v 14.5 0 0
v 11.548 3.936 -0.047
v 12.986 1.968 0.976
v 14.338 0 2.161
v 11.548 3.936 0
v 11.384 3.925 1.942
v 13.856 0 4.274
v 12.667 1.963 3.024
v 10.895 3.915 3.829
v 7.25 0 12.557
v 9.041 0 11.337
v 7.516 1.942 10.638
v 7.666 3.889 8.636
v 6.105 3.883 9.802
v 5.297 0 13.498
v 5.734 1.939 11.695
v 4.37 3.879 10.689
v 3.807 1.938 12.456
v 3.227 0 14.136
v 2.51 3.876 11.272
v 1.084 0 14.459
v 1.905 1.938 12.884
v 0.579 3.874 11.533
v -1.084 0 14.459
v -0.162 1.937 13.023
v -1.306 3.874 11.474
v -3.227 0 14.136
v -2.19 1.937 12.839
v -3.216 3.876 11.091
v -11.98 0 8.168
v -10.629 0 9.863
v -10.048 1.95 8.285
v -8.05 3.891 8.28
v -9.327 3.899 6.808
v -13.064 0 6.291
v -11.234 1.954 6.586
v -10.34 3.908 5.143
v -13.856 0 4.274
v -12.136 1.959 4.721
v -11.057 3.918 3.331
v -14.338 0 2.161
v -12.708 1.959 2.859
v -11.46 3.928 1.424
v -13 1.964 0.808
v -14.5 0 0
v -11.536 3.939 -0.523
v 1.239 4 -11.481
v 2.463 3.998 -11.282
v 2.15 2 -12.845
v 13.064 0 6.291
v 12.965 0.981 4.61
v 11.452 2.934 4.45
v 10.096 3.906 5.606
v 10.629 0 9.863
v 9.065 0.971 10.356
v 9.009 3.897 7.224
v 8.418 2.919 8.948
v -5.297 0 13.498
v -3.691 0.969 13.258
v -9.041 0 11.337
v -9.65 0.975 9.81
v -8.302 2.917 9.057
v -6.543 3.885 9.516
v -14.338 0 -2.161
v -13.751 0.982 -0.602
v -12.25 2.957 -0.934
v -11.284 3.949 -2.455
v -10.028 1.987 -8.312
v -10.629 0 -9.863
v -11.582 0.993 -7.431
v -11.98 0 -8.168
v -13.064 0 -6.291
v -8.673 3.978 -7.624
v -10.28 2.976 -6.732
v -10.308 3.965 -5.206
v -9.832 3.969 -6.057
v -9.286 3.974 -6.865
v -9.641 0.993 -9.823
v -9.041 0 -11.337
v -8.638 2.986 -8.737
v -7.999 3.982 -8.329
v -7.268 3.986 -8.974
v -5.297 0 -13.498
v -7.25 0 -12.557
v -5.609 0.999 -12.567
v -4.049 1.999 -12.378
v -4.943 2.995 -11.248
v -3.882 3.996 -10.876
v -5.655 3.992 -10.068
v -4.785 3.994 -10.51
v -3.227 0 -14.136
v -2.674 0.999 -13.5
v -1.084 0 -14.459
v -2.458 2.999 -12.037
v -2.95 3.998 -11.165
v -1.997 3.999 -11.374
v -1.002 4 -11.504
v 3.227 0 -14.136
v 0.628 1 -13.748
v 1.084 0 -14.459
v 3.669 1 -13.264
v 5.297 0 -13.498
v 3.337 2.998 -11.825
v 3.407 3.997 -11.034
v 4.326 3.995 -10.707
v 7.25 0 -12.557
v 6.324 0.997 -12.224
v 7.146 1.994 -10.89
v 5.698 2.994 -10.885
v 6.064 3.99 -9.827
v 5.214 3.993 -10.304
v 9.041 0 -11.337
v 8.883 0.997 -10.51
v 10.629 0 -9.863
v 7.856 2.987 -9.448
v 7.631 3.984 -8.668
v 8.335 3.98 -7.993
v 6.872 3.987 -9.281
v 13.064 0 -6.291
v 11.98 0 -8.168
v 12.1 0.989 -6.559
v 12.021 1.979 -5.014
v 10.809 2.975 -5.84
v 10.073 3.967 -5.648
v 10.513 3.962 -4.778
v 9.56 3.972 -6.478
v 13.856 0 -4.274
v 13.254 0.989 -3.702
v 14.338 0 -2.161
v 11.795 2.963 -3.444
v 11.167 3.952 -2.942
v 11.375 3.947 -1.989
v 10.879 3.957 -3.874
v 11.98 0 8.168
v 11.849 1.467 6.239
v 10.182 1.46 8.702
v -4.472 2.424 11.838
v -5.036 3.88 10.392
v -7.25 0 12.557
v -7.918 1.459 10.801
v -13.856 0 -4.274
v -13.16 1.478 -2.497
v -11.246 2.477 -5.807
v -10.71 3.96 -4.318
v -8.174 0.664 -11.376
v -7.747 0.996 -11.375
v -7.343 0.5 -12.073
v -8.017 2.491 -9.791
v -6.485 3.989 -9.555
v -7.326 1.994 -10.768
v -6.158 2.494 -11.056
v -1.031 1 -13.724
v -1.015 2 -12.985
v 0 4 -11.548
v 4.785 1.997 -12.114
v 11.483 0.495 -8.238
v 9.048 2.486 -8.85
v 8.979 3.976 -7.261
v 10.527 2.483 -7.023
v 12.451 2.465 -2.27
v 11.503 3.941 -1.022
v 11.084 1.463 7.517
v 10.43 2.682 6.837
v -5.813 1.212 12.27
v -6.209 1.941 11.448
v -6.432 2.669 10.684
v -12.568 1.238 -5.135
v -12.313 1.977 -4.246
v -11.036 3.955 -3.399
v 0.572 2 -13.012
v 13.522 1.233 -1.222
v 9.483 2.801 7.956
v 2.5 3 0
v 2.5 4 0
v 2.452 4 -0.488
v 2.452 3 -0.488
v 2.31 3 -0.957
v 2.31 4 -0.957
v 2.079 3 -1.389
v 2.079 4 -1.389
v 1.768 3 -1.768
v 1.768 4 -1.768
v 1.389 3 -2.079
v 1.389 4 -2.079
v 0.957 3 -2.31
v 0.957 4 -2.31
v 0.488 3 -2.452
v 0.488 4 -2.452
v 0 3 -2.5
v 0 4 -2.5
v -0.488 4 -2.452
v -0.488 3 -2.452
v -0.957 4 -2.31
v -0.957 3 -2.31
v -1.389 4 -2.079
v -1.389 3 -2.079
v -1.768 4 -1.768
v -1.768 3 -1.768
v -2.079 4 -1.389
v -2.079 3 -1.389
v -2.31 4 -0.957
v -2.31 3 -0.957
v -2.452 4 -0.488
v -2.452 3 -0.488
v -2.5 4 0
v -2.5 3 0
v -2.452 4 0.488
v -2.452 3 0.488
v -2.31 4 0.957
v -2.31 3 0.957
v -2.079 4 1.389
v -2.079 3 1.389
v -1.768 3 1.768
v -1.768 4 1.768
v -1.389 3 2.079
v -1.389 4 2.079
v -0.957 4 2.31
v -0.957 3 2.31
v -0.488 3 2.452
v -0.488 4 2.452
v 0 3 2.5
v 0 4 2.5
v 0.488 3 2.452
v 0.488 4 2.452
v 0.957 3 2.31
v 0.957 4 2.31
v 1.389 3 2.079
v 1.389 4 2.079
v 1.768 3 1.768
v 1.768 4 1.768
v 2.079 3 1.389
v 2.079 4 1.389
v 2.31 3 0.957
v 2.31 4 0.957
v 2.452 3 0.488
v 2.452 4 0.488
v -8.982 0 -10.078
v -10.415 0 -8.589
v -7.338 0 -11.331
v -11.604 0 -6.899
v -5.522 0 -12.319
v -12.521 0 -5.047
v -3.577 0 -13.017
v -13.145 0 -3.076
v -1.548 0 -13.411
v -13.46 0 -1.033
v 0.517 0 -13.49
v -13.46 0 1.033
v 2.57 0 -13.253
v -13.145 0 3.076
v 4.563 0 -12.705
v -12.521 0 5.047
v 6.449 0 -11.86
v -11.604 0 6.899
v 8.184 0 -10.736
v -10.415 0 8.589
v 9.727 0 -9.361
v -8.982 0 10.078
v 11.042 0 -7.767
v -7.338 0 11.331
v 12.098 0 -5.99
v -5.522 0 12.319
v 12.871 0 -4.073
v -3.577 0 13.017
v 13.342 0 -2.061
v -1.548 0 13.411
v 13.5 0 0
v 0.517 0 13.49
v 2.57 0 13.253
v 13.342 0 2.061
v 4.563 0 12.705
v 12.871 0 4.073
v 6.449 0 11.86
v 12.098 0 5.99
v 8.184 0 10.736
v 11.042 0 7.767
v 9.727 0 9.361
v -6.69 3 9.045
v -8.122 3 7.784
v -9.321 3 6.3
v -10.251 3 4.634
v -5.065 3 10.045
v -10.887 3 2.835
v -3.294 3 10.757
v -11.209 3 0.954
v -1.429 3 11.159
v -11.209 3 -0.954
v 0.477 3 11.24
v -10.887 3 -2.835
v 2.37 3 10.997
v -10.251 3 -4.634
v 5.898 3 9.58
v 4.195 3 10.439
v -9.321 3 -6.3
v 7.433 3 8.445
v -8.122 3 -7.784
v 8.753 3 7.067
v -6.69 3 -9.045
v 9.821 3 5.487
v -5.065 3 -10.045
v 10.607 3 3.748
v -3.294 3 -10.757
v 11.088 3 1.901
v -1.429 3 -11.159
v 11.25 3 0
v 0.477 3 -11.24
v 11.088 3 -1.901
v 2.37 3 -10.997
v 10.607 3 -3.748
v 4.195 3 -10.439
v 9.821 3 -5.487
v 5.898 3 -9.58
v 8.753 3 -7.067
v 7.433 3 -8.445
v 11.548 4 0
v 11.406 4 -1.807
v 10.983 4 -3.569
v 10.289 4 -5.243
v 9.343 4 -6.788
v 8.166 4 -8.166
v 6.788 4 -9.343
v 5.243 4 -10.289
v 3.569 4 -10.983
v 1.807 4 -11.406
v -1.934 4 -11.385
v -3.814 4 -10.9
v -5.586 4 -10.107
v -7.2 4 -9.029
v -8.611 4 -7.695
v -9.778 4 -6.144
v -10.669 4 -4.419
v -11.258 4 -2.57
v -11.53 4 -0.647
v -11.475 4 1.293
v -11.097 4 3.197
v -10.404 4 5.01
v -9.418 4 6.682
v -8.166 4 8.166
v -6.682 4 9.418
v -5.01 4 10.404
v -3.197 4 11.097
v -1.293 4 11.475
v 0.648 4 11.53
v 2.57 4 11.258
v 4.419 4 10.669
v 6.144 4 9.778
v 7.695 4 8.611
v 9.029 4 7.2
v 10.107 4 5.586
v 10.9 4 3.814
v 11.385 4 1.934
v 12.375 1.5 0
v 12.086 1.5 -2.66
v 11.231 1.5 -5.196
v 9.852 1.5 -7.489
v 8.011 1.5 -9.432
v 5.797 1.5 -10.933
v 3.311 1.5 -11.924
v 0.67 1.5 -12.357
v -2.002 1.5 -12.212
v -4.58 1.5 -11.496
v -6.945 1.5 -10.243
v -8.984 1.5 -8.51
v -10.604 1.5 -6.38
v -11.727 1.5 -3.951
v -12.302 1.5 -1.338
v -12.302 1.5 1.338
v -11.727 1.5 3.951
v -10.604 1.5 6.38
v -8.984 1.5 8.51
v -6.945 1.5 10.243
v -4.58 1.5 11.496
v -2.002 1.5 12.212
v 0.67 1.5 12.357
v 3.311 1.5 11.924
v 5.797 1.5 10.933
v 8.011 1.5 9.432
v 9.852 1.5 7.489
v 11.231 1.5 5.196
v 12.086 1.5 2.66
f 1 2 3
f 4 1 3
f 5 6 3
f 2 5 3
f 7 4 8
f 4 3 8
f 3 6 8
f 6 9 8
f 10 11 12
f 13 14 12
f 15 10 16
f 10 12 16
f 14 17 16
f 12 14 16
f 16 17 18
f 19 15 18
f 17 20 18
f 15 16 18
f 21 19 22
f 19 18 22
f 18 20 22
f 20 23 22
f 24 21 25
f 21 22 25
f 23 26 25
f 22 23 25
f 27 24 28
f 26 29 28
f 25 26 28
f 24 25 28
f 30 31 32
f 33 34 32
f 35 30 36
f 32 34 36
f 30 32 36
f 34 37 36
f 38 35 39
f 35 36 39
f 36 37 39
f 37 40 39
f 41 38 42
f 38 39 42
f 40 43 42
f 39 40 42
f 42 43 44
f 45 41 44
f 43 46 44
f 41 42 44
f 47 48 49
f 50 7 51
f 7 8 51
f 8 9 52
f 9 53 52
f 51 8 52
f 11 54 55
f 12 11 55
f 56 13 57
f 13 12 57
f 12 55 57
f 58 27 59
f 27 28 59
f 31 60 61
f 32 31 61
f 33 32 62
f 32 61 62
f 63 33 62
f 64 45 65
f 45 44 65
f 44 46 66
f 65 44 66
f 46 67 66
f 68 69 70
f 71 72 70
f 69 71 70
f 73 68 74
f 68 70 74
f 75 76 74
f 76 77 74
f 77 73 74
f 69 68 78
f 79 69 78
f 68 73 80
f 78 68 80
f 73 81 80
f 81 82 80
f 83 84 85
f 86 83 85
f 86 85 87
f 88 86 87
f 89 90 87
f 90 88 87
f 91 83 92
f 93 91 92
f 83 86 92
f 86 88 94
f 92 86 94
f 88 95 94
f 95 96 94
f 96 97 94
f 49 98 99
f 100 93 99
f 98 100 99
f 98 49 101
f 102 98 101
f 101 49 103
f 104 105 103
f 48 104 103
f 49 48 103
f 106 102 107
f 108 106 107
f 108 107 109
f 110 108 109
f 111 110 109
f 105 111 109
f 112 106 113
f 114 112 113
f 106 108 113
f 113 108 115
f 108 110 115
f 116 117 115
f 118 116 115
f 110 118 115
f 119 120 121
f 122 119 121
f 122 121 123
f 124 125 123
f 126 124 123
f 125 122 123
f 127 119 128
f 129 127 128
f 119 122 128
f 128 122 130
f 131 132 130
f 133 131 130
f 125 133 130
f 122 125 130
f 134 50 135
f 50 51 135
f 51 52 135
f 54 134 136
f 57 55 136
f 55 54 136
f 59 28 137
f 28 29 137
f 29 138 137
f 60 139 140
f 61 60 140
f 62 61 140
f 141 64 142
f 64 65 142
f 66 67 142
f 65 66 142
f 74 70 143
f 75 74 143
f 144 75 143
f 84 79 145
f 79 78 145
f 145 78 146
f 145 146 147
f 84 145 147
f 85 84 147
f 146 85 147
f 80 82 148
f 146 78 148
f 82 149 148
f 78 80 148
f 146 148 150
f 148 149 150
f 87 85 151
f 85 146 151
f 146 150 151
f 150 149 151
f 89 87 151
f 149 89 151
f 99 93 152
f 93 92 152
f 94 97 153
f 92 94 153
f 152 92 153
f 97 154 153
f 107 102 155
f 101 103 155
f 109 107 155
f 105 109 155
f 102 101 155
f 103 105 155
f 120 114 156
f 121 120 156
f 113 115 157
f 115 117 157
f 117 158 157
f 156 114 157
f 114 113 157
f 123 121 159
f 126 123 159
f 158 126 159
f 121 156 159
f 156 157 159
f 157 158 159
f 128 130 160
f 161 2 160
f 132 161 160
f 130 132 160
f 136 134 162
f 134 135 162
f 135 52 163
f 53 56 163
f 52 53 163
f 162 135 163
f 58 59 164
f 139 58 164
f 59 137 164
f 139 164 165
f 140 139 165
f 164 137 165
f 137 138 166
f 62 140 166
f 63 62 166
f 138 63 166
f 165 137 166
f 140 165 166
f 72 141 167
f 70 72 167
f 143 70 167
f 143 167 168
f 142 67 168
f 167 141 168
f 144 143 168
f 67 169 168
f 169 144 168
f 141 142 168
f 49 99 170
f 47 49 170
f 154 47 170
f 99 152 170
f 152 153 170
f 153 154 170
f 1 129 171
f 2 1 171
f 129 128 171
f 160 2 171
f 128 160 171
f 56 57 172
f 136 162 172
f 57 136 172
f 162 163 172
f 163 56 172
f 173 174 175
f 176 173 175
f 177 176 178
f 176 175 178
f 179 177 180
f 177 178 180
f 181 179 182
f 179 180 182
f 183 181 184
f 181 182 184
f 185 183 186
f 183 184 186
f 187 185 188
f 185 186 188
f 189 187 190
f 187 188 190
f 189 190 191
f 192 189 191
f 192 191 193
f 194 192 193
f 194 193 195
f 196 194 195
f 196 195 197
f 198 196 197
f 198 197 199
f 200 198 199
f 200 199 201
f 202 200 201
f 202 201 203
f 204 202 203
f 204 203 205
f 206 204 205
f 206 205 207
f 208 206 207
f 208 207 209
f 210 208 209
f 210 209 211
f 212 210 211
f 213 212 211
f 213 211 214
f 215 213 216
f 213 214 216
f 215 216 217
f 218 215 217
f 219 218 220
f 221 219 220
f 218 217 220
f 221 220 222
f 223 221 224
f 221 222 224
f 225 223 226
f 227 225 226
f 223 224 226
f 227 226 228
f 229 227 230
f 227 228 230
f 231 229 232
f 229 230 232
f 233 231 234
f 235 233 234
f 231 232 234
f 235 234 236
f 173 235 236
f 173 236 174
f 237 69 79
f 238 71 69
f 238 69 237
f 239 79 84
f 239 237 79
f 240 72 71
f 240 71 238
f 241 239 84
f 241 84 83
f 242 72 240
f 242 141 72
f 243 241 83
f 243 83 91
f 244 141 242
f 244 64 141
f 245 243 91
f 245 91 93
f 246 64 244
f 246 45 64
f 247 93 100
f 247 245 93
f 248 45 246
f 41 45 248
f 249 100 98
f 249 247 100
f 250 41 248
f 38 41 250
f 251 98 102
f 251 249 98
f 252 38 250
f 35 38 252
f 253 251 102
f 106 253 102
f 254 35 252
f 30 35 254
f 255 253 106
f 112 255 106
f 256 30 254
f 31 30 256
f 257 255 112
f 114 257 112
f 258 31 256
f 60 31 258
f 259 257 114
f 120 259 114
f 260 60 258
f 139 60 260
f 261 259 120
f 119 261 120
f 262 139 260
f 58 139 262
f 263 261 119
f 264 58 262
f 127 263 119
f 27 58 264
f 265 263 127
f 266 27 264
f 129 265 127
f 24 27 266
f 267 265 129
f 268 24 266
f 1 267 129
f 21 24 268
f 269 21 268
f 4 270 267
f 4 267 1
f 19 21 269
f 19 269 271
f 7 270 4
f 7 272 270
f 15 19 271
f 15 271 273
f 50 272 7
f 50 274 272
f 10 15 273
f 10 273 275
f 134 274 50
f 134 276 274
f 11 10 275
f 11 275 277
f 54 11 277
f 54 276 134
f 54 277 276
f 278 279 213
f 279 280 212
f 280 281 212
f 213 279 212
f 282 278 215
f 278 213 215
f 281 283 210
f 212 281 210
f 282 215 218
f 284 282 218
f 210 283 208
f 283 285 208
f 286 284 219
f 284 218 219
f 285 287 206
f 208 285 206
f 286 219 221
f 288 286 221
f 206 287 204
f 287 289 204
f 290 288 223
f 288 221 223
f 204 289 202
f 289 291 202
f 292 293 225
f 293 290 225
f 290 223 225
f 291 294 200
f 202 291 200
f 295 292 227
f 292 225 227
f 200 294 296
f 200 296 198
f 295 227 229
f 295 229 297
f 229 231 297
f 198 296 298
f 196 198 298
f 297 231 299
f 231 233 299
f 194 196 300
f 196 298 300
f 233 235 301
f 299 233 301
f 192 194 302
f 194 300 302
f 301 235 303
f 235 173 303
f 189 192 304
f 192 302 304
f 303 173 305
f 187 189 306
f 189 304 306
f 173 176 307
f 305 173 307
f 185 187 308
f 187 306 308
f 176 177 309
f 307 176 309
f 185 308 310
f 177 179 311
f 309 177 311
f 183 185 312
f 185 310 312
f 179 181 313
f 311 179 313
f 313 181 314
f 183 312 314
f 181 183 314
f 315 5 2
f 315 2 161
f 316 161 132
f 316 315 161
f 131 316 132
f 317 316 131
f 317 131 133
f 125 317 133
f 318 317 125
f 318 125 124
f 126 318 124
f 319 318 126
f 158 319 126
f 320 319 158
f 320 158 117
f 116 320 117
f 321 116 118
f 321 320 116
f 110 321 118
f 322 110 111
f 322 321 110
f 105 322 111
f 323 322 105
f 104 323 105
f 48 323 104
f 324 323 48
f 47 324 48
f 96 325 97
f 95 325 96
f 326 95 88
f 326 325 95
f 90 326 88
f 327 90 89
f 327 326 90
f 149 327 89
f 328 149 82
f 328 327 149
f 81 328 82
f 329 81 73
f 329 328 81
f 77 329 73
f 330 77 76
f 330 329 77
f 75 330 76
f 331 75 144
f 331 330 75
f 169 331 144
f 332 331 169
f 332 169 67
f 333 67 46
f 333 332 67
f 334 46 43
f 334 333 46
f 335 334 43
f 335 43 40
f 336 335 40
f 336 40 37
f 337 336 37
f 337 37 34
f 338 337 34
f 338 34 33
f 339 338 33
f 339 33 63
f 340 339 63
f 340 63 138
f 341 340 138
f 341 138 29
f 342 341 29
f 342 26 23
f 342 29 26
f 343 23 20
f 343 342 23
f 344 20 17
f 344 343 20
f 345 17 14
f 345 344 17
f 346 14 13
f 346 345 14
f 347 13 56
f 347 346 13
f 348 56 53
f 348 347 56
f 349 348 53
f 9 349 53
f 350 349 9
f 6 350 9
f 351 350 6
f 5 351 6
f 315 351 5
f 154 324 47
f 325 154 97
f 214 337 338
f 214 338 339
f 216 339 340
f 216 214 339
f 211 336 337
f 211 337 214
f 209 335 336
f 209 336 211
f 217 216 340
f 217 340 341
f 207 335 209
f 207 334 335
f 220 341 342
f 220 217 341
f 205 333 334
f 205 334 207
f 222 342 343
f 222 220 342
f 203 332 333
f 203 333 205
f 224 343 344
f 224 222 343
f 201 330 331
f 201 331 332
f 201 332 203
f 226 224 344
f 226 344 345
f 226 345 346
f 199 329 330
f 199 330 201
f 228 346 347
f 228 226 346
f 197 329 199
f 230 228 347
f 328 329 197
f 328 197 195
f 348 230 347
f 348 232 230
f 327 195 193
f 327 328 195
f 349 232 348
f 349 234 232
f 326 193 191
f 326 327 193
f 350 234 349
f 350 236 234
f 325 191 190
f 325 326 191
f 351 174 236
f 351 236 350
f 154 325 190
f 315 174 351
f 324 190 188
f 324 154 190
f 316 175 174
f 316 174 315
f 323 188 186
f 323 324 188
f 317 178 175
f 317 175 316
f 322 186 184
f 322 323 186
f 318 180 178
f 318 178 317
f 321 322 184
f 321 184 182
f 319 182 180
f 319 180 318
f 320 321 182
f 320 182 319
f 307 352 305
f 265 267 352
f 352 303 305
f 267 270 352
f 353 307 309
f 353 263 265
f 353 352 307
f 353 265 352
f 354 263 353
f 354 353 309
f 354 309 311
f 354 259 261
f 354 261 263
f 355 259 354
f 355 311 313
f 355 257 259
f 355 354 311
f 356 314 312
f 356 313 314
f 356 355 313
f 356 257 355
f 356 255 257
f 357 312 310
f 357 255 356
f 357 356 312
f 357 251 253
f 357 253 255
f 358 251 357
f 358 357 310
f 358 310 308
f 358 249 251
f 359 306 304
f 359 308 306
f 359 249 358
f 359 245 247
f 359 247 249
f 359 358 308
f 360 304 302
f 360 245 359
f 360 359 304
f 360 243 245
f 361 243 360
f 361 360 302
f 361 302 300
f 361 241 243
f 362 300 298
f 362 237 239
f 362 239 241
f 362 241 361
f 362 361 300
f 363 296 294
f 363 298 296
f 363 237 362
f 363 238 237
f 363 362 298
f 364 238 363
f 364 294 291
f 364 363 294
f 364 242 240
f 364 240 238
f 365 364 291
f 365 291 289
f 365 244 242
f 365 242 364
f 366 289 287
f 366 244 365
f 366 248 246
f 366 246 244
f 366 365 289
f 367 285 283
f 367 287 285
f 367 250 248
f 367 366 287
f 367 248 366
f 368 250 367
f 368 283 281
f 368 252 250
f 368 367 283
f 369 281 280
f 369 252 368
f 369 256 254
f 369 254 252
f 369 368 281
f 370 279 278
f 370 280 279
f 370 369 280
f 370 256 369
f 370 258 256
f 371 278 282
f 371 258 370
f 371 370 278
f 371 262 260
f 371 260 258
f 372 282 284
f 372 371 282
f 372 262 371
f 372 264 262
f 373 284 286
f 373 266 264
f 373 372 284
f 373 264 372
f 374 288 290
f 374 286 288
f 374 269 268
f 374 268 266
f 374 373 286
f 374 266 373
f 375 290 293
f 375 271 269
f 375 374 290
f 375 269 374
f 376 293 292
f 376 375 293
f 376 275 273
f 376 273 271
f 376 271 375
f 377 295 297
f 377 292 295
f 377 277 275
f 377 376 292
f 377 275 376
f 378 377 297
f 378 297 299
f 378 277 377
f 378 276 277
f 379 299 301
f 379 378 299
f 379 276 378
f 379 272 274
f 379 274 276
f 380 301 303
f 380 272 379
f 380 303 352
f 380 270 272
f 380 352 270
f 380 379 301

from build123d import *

# Parameters (mm, degrees)
SKETCH_R     = 14.5
SKETCH001_R  = 11.5
SKETCH003_R  = 10.5
SKETCH002_R  = 13.5
SKETCH004_R  = 11.547972
PAD_DEPTH    = 1
SKETCH005_R  = 2.5
POCKET_DEPTH = 5


with BuildPart() as part:
    # Sketch → AdditiveLoft section 0
    with BuildSketch(Plane.XZ):
        Circle(SKETCH_R)
    # Sketch001 (on DatumPlane) → AdditiveLoft section 1
    with BuildSketch(Plane.XZ.offset(-4)):
        with Locations((0, -0.047972)):
            Circle(SKETCH001_R)
    loft()

    # Sketch003 (on Face3 of AdditiveLoft) → SubtractiveLoft section 0
    with BuildSketch(Plane(origin=(0, 4, 0), x_dir=(1, 0, 0), z_dir=(0, 1, 0))):
        Circle(SKETCH003_R)
    # Sketch002 (on Face1 of AdditiveLoft) → SubtractiveLoft section 1
    with BuildSketch(Plane.XZ):
        Circle(SKETCH002_R)
    loft(mode=Mode.SUBTRACT)

    # Sketch004 (on Face4 of SubtractiveLoft) → Pad (new body)
    with BuildSketch(Plane(origin=(0, 4, 0), x_dir=(1, 0, 0), z_dir=(0, 1, 0))):
        Circle(SKETCH004_R)
    extrude(amount=-PAD_DEPTH)

    # Sketch005 (on Face9 of Pad) → Pocket (cut)
    with BuildSketch(Plane(origin=(0, 4, 0), x_dir=(1, 0, 0), z_dir=(0, 1, 0))):
        Circle(SKETCH005_R)
    extrude(amount=-POCKET_DEPTH, mode=Mode.SUBTRACT)


solid = part.part
